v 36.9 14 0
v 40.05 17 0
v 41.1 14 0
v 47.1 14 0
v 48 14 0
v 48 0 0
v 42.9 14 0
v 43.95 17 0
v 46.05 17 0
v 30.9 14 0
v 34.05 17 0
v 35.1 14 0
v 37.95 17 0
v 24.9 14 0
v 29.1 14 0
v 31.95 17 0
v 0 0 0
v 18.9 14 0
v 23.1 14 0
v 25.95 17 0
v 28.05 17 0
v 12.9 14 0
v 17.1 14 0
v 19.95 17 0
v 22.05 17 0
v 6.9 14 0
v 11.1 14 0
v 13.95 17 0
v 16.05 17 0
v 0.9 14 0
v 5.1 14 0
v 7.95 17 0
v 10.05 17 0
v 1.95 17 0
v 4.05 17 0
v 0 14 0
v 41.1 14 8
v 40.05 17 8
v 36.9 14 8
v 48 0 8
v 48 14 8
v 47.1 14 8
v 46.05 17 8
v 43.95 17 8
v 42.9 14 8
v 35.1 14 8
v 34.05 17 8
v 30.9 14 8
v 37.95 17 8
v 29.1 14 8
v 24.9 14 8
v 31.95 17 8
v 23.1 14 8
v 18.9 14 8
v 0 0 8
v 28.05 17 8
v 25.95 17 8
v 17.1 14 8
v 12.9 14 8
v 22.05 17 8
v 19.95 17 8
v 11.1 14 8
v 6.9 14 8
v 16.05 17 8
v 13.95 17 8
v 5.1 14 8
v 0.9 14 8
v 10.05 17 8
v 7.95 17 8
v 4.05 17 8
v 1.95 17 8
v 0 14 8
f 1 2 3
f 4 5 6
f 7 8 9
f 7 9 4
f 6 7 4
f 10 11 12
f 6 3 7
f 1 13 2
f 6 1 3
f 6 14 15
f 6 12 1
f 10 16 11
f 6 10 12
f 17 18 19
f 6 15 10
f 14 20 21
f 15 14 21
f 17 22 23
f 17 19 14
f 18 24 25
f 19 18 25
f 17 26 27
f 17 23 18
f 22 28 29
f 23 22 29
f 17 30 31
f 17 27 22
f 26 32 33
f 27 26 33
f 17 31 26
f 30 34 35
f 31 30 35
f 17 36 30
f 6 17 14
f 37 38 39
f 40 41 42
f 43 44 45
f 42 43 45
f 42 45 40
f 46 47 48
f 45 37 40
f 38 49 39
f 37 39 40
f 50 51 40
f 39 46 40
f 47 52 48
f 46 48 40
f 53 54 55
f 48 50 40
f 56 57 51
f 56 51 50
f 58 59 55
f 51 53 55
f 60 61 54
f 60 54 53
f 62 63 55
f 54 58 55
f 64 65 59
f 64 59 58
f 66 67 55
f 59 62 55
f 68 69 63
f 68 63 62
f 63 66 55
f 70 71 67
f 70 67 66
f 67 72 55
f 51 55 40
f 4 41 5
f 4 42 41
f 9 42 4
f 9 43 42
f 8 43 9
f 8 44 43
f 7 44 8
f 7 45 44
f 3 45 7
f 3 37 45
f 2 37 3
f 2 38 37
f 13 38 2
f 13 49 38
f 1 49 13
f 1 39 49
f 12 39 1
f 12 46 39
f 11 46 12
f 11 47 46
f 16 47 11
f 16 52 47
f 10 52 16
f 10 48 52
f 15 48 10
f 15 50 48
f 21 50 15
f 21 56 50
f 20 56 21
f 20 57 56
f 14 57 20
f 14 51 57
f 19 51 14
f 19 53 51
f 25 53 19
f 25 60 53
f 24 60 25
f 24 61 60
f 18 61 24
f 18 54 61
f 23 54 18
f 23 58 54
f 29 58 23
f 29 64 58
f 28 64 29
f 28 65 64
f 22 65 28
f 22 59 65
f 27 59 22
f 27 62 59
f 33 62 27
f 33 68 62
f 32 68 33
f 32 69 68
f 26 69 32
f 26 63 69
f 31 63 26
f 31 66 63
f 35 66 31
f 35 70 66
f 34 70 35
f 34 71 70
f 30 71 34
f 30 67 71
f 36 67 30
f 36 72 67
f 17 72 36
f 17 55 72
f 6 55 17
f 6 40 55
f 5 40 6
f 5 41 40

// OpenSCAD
$fn = 32;

// ----------------------------------------------------------------------
// Gear rack: 8 teeth, pitch 6 mm
// ----------------------------------------------------------------------

// --- parameters (mm) ---
teeth = 8;                // number of teeth
pitch = 6;                // tooth pitch, X
root_w = 4.2;             // tooth width at the root
tip_w = 2.1;              // tooth width at the tip
base_h = 14;              // rack body height, Y
tooth_h = 3;              // tooth height above the body
plate_t = 8;              // rack width, Z (extrusion height)

rack_l = teeth * pitch;  // overall length
total_h = base_h + tooth_h;  // overall height

profile = [[0, 0], [48, 0], [48, 14], [47.1, 14], [46.05, 17], [43.95, 17], [42.9, 14], [41.1, 14], [40.05, 17], [37.95, 17], [36.9, 14], [35.1, 14], [34.05, 17], [31.95, 17], [30.9, 14], [29.1, 14], [28.05, 17], [25.95, 17], [24.9, 14], [23.1, 14], [22.05, 17], [19.95, 17], [18.9, 14], [17.1, 14], [16.05, 17], [13.95, 17], [12.9, 14], [11.1, 14], [10.05, 17], [7.95, 17], [6.9, 14], [5.1, 14], [4.05, 17], [1.95, 17], [0.9, 14], [0, 14]];  // primary outline, 36 points, counter clockwise

// --- the one profile operation ---
linear_extrude(height = plate_t) polygon(points = profile);
